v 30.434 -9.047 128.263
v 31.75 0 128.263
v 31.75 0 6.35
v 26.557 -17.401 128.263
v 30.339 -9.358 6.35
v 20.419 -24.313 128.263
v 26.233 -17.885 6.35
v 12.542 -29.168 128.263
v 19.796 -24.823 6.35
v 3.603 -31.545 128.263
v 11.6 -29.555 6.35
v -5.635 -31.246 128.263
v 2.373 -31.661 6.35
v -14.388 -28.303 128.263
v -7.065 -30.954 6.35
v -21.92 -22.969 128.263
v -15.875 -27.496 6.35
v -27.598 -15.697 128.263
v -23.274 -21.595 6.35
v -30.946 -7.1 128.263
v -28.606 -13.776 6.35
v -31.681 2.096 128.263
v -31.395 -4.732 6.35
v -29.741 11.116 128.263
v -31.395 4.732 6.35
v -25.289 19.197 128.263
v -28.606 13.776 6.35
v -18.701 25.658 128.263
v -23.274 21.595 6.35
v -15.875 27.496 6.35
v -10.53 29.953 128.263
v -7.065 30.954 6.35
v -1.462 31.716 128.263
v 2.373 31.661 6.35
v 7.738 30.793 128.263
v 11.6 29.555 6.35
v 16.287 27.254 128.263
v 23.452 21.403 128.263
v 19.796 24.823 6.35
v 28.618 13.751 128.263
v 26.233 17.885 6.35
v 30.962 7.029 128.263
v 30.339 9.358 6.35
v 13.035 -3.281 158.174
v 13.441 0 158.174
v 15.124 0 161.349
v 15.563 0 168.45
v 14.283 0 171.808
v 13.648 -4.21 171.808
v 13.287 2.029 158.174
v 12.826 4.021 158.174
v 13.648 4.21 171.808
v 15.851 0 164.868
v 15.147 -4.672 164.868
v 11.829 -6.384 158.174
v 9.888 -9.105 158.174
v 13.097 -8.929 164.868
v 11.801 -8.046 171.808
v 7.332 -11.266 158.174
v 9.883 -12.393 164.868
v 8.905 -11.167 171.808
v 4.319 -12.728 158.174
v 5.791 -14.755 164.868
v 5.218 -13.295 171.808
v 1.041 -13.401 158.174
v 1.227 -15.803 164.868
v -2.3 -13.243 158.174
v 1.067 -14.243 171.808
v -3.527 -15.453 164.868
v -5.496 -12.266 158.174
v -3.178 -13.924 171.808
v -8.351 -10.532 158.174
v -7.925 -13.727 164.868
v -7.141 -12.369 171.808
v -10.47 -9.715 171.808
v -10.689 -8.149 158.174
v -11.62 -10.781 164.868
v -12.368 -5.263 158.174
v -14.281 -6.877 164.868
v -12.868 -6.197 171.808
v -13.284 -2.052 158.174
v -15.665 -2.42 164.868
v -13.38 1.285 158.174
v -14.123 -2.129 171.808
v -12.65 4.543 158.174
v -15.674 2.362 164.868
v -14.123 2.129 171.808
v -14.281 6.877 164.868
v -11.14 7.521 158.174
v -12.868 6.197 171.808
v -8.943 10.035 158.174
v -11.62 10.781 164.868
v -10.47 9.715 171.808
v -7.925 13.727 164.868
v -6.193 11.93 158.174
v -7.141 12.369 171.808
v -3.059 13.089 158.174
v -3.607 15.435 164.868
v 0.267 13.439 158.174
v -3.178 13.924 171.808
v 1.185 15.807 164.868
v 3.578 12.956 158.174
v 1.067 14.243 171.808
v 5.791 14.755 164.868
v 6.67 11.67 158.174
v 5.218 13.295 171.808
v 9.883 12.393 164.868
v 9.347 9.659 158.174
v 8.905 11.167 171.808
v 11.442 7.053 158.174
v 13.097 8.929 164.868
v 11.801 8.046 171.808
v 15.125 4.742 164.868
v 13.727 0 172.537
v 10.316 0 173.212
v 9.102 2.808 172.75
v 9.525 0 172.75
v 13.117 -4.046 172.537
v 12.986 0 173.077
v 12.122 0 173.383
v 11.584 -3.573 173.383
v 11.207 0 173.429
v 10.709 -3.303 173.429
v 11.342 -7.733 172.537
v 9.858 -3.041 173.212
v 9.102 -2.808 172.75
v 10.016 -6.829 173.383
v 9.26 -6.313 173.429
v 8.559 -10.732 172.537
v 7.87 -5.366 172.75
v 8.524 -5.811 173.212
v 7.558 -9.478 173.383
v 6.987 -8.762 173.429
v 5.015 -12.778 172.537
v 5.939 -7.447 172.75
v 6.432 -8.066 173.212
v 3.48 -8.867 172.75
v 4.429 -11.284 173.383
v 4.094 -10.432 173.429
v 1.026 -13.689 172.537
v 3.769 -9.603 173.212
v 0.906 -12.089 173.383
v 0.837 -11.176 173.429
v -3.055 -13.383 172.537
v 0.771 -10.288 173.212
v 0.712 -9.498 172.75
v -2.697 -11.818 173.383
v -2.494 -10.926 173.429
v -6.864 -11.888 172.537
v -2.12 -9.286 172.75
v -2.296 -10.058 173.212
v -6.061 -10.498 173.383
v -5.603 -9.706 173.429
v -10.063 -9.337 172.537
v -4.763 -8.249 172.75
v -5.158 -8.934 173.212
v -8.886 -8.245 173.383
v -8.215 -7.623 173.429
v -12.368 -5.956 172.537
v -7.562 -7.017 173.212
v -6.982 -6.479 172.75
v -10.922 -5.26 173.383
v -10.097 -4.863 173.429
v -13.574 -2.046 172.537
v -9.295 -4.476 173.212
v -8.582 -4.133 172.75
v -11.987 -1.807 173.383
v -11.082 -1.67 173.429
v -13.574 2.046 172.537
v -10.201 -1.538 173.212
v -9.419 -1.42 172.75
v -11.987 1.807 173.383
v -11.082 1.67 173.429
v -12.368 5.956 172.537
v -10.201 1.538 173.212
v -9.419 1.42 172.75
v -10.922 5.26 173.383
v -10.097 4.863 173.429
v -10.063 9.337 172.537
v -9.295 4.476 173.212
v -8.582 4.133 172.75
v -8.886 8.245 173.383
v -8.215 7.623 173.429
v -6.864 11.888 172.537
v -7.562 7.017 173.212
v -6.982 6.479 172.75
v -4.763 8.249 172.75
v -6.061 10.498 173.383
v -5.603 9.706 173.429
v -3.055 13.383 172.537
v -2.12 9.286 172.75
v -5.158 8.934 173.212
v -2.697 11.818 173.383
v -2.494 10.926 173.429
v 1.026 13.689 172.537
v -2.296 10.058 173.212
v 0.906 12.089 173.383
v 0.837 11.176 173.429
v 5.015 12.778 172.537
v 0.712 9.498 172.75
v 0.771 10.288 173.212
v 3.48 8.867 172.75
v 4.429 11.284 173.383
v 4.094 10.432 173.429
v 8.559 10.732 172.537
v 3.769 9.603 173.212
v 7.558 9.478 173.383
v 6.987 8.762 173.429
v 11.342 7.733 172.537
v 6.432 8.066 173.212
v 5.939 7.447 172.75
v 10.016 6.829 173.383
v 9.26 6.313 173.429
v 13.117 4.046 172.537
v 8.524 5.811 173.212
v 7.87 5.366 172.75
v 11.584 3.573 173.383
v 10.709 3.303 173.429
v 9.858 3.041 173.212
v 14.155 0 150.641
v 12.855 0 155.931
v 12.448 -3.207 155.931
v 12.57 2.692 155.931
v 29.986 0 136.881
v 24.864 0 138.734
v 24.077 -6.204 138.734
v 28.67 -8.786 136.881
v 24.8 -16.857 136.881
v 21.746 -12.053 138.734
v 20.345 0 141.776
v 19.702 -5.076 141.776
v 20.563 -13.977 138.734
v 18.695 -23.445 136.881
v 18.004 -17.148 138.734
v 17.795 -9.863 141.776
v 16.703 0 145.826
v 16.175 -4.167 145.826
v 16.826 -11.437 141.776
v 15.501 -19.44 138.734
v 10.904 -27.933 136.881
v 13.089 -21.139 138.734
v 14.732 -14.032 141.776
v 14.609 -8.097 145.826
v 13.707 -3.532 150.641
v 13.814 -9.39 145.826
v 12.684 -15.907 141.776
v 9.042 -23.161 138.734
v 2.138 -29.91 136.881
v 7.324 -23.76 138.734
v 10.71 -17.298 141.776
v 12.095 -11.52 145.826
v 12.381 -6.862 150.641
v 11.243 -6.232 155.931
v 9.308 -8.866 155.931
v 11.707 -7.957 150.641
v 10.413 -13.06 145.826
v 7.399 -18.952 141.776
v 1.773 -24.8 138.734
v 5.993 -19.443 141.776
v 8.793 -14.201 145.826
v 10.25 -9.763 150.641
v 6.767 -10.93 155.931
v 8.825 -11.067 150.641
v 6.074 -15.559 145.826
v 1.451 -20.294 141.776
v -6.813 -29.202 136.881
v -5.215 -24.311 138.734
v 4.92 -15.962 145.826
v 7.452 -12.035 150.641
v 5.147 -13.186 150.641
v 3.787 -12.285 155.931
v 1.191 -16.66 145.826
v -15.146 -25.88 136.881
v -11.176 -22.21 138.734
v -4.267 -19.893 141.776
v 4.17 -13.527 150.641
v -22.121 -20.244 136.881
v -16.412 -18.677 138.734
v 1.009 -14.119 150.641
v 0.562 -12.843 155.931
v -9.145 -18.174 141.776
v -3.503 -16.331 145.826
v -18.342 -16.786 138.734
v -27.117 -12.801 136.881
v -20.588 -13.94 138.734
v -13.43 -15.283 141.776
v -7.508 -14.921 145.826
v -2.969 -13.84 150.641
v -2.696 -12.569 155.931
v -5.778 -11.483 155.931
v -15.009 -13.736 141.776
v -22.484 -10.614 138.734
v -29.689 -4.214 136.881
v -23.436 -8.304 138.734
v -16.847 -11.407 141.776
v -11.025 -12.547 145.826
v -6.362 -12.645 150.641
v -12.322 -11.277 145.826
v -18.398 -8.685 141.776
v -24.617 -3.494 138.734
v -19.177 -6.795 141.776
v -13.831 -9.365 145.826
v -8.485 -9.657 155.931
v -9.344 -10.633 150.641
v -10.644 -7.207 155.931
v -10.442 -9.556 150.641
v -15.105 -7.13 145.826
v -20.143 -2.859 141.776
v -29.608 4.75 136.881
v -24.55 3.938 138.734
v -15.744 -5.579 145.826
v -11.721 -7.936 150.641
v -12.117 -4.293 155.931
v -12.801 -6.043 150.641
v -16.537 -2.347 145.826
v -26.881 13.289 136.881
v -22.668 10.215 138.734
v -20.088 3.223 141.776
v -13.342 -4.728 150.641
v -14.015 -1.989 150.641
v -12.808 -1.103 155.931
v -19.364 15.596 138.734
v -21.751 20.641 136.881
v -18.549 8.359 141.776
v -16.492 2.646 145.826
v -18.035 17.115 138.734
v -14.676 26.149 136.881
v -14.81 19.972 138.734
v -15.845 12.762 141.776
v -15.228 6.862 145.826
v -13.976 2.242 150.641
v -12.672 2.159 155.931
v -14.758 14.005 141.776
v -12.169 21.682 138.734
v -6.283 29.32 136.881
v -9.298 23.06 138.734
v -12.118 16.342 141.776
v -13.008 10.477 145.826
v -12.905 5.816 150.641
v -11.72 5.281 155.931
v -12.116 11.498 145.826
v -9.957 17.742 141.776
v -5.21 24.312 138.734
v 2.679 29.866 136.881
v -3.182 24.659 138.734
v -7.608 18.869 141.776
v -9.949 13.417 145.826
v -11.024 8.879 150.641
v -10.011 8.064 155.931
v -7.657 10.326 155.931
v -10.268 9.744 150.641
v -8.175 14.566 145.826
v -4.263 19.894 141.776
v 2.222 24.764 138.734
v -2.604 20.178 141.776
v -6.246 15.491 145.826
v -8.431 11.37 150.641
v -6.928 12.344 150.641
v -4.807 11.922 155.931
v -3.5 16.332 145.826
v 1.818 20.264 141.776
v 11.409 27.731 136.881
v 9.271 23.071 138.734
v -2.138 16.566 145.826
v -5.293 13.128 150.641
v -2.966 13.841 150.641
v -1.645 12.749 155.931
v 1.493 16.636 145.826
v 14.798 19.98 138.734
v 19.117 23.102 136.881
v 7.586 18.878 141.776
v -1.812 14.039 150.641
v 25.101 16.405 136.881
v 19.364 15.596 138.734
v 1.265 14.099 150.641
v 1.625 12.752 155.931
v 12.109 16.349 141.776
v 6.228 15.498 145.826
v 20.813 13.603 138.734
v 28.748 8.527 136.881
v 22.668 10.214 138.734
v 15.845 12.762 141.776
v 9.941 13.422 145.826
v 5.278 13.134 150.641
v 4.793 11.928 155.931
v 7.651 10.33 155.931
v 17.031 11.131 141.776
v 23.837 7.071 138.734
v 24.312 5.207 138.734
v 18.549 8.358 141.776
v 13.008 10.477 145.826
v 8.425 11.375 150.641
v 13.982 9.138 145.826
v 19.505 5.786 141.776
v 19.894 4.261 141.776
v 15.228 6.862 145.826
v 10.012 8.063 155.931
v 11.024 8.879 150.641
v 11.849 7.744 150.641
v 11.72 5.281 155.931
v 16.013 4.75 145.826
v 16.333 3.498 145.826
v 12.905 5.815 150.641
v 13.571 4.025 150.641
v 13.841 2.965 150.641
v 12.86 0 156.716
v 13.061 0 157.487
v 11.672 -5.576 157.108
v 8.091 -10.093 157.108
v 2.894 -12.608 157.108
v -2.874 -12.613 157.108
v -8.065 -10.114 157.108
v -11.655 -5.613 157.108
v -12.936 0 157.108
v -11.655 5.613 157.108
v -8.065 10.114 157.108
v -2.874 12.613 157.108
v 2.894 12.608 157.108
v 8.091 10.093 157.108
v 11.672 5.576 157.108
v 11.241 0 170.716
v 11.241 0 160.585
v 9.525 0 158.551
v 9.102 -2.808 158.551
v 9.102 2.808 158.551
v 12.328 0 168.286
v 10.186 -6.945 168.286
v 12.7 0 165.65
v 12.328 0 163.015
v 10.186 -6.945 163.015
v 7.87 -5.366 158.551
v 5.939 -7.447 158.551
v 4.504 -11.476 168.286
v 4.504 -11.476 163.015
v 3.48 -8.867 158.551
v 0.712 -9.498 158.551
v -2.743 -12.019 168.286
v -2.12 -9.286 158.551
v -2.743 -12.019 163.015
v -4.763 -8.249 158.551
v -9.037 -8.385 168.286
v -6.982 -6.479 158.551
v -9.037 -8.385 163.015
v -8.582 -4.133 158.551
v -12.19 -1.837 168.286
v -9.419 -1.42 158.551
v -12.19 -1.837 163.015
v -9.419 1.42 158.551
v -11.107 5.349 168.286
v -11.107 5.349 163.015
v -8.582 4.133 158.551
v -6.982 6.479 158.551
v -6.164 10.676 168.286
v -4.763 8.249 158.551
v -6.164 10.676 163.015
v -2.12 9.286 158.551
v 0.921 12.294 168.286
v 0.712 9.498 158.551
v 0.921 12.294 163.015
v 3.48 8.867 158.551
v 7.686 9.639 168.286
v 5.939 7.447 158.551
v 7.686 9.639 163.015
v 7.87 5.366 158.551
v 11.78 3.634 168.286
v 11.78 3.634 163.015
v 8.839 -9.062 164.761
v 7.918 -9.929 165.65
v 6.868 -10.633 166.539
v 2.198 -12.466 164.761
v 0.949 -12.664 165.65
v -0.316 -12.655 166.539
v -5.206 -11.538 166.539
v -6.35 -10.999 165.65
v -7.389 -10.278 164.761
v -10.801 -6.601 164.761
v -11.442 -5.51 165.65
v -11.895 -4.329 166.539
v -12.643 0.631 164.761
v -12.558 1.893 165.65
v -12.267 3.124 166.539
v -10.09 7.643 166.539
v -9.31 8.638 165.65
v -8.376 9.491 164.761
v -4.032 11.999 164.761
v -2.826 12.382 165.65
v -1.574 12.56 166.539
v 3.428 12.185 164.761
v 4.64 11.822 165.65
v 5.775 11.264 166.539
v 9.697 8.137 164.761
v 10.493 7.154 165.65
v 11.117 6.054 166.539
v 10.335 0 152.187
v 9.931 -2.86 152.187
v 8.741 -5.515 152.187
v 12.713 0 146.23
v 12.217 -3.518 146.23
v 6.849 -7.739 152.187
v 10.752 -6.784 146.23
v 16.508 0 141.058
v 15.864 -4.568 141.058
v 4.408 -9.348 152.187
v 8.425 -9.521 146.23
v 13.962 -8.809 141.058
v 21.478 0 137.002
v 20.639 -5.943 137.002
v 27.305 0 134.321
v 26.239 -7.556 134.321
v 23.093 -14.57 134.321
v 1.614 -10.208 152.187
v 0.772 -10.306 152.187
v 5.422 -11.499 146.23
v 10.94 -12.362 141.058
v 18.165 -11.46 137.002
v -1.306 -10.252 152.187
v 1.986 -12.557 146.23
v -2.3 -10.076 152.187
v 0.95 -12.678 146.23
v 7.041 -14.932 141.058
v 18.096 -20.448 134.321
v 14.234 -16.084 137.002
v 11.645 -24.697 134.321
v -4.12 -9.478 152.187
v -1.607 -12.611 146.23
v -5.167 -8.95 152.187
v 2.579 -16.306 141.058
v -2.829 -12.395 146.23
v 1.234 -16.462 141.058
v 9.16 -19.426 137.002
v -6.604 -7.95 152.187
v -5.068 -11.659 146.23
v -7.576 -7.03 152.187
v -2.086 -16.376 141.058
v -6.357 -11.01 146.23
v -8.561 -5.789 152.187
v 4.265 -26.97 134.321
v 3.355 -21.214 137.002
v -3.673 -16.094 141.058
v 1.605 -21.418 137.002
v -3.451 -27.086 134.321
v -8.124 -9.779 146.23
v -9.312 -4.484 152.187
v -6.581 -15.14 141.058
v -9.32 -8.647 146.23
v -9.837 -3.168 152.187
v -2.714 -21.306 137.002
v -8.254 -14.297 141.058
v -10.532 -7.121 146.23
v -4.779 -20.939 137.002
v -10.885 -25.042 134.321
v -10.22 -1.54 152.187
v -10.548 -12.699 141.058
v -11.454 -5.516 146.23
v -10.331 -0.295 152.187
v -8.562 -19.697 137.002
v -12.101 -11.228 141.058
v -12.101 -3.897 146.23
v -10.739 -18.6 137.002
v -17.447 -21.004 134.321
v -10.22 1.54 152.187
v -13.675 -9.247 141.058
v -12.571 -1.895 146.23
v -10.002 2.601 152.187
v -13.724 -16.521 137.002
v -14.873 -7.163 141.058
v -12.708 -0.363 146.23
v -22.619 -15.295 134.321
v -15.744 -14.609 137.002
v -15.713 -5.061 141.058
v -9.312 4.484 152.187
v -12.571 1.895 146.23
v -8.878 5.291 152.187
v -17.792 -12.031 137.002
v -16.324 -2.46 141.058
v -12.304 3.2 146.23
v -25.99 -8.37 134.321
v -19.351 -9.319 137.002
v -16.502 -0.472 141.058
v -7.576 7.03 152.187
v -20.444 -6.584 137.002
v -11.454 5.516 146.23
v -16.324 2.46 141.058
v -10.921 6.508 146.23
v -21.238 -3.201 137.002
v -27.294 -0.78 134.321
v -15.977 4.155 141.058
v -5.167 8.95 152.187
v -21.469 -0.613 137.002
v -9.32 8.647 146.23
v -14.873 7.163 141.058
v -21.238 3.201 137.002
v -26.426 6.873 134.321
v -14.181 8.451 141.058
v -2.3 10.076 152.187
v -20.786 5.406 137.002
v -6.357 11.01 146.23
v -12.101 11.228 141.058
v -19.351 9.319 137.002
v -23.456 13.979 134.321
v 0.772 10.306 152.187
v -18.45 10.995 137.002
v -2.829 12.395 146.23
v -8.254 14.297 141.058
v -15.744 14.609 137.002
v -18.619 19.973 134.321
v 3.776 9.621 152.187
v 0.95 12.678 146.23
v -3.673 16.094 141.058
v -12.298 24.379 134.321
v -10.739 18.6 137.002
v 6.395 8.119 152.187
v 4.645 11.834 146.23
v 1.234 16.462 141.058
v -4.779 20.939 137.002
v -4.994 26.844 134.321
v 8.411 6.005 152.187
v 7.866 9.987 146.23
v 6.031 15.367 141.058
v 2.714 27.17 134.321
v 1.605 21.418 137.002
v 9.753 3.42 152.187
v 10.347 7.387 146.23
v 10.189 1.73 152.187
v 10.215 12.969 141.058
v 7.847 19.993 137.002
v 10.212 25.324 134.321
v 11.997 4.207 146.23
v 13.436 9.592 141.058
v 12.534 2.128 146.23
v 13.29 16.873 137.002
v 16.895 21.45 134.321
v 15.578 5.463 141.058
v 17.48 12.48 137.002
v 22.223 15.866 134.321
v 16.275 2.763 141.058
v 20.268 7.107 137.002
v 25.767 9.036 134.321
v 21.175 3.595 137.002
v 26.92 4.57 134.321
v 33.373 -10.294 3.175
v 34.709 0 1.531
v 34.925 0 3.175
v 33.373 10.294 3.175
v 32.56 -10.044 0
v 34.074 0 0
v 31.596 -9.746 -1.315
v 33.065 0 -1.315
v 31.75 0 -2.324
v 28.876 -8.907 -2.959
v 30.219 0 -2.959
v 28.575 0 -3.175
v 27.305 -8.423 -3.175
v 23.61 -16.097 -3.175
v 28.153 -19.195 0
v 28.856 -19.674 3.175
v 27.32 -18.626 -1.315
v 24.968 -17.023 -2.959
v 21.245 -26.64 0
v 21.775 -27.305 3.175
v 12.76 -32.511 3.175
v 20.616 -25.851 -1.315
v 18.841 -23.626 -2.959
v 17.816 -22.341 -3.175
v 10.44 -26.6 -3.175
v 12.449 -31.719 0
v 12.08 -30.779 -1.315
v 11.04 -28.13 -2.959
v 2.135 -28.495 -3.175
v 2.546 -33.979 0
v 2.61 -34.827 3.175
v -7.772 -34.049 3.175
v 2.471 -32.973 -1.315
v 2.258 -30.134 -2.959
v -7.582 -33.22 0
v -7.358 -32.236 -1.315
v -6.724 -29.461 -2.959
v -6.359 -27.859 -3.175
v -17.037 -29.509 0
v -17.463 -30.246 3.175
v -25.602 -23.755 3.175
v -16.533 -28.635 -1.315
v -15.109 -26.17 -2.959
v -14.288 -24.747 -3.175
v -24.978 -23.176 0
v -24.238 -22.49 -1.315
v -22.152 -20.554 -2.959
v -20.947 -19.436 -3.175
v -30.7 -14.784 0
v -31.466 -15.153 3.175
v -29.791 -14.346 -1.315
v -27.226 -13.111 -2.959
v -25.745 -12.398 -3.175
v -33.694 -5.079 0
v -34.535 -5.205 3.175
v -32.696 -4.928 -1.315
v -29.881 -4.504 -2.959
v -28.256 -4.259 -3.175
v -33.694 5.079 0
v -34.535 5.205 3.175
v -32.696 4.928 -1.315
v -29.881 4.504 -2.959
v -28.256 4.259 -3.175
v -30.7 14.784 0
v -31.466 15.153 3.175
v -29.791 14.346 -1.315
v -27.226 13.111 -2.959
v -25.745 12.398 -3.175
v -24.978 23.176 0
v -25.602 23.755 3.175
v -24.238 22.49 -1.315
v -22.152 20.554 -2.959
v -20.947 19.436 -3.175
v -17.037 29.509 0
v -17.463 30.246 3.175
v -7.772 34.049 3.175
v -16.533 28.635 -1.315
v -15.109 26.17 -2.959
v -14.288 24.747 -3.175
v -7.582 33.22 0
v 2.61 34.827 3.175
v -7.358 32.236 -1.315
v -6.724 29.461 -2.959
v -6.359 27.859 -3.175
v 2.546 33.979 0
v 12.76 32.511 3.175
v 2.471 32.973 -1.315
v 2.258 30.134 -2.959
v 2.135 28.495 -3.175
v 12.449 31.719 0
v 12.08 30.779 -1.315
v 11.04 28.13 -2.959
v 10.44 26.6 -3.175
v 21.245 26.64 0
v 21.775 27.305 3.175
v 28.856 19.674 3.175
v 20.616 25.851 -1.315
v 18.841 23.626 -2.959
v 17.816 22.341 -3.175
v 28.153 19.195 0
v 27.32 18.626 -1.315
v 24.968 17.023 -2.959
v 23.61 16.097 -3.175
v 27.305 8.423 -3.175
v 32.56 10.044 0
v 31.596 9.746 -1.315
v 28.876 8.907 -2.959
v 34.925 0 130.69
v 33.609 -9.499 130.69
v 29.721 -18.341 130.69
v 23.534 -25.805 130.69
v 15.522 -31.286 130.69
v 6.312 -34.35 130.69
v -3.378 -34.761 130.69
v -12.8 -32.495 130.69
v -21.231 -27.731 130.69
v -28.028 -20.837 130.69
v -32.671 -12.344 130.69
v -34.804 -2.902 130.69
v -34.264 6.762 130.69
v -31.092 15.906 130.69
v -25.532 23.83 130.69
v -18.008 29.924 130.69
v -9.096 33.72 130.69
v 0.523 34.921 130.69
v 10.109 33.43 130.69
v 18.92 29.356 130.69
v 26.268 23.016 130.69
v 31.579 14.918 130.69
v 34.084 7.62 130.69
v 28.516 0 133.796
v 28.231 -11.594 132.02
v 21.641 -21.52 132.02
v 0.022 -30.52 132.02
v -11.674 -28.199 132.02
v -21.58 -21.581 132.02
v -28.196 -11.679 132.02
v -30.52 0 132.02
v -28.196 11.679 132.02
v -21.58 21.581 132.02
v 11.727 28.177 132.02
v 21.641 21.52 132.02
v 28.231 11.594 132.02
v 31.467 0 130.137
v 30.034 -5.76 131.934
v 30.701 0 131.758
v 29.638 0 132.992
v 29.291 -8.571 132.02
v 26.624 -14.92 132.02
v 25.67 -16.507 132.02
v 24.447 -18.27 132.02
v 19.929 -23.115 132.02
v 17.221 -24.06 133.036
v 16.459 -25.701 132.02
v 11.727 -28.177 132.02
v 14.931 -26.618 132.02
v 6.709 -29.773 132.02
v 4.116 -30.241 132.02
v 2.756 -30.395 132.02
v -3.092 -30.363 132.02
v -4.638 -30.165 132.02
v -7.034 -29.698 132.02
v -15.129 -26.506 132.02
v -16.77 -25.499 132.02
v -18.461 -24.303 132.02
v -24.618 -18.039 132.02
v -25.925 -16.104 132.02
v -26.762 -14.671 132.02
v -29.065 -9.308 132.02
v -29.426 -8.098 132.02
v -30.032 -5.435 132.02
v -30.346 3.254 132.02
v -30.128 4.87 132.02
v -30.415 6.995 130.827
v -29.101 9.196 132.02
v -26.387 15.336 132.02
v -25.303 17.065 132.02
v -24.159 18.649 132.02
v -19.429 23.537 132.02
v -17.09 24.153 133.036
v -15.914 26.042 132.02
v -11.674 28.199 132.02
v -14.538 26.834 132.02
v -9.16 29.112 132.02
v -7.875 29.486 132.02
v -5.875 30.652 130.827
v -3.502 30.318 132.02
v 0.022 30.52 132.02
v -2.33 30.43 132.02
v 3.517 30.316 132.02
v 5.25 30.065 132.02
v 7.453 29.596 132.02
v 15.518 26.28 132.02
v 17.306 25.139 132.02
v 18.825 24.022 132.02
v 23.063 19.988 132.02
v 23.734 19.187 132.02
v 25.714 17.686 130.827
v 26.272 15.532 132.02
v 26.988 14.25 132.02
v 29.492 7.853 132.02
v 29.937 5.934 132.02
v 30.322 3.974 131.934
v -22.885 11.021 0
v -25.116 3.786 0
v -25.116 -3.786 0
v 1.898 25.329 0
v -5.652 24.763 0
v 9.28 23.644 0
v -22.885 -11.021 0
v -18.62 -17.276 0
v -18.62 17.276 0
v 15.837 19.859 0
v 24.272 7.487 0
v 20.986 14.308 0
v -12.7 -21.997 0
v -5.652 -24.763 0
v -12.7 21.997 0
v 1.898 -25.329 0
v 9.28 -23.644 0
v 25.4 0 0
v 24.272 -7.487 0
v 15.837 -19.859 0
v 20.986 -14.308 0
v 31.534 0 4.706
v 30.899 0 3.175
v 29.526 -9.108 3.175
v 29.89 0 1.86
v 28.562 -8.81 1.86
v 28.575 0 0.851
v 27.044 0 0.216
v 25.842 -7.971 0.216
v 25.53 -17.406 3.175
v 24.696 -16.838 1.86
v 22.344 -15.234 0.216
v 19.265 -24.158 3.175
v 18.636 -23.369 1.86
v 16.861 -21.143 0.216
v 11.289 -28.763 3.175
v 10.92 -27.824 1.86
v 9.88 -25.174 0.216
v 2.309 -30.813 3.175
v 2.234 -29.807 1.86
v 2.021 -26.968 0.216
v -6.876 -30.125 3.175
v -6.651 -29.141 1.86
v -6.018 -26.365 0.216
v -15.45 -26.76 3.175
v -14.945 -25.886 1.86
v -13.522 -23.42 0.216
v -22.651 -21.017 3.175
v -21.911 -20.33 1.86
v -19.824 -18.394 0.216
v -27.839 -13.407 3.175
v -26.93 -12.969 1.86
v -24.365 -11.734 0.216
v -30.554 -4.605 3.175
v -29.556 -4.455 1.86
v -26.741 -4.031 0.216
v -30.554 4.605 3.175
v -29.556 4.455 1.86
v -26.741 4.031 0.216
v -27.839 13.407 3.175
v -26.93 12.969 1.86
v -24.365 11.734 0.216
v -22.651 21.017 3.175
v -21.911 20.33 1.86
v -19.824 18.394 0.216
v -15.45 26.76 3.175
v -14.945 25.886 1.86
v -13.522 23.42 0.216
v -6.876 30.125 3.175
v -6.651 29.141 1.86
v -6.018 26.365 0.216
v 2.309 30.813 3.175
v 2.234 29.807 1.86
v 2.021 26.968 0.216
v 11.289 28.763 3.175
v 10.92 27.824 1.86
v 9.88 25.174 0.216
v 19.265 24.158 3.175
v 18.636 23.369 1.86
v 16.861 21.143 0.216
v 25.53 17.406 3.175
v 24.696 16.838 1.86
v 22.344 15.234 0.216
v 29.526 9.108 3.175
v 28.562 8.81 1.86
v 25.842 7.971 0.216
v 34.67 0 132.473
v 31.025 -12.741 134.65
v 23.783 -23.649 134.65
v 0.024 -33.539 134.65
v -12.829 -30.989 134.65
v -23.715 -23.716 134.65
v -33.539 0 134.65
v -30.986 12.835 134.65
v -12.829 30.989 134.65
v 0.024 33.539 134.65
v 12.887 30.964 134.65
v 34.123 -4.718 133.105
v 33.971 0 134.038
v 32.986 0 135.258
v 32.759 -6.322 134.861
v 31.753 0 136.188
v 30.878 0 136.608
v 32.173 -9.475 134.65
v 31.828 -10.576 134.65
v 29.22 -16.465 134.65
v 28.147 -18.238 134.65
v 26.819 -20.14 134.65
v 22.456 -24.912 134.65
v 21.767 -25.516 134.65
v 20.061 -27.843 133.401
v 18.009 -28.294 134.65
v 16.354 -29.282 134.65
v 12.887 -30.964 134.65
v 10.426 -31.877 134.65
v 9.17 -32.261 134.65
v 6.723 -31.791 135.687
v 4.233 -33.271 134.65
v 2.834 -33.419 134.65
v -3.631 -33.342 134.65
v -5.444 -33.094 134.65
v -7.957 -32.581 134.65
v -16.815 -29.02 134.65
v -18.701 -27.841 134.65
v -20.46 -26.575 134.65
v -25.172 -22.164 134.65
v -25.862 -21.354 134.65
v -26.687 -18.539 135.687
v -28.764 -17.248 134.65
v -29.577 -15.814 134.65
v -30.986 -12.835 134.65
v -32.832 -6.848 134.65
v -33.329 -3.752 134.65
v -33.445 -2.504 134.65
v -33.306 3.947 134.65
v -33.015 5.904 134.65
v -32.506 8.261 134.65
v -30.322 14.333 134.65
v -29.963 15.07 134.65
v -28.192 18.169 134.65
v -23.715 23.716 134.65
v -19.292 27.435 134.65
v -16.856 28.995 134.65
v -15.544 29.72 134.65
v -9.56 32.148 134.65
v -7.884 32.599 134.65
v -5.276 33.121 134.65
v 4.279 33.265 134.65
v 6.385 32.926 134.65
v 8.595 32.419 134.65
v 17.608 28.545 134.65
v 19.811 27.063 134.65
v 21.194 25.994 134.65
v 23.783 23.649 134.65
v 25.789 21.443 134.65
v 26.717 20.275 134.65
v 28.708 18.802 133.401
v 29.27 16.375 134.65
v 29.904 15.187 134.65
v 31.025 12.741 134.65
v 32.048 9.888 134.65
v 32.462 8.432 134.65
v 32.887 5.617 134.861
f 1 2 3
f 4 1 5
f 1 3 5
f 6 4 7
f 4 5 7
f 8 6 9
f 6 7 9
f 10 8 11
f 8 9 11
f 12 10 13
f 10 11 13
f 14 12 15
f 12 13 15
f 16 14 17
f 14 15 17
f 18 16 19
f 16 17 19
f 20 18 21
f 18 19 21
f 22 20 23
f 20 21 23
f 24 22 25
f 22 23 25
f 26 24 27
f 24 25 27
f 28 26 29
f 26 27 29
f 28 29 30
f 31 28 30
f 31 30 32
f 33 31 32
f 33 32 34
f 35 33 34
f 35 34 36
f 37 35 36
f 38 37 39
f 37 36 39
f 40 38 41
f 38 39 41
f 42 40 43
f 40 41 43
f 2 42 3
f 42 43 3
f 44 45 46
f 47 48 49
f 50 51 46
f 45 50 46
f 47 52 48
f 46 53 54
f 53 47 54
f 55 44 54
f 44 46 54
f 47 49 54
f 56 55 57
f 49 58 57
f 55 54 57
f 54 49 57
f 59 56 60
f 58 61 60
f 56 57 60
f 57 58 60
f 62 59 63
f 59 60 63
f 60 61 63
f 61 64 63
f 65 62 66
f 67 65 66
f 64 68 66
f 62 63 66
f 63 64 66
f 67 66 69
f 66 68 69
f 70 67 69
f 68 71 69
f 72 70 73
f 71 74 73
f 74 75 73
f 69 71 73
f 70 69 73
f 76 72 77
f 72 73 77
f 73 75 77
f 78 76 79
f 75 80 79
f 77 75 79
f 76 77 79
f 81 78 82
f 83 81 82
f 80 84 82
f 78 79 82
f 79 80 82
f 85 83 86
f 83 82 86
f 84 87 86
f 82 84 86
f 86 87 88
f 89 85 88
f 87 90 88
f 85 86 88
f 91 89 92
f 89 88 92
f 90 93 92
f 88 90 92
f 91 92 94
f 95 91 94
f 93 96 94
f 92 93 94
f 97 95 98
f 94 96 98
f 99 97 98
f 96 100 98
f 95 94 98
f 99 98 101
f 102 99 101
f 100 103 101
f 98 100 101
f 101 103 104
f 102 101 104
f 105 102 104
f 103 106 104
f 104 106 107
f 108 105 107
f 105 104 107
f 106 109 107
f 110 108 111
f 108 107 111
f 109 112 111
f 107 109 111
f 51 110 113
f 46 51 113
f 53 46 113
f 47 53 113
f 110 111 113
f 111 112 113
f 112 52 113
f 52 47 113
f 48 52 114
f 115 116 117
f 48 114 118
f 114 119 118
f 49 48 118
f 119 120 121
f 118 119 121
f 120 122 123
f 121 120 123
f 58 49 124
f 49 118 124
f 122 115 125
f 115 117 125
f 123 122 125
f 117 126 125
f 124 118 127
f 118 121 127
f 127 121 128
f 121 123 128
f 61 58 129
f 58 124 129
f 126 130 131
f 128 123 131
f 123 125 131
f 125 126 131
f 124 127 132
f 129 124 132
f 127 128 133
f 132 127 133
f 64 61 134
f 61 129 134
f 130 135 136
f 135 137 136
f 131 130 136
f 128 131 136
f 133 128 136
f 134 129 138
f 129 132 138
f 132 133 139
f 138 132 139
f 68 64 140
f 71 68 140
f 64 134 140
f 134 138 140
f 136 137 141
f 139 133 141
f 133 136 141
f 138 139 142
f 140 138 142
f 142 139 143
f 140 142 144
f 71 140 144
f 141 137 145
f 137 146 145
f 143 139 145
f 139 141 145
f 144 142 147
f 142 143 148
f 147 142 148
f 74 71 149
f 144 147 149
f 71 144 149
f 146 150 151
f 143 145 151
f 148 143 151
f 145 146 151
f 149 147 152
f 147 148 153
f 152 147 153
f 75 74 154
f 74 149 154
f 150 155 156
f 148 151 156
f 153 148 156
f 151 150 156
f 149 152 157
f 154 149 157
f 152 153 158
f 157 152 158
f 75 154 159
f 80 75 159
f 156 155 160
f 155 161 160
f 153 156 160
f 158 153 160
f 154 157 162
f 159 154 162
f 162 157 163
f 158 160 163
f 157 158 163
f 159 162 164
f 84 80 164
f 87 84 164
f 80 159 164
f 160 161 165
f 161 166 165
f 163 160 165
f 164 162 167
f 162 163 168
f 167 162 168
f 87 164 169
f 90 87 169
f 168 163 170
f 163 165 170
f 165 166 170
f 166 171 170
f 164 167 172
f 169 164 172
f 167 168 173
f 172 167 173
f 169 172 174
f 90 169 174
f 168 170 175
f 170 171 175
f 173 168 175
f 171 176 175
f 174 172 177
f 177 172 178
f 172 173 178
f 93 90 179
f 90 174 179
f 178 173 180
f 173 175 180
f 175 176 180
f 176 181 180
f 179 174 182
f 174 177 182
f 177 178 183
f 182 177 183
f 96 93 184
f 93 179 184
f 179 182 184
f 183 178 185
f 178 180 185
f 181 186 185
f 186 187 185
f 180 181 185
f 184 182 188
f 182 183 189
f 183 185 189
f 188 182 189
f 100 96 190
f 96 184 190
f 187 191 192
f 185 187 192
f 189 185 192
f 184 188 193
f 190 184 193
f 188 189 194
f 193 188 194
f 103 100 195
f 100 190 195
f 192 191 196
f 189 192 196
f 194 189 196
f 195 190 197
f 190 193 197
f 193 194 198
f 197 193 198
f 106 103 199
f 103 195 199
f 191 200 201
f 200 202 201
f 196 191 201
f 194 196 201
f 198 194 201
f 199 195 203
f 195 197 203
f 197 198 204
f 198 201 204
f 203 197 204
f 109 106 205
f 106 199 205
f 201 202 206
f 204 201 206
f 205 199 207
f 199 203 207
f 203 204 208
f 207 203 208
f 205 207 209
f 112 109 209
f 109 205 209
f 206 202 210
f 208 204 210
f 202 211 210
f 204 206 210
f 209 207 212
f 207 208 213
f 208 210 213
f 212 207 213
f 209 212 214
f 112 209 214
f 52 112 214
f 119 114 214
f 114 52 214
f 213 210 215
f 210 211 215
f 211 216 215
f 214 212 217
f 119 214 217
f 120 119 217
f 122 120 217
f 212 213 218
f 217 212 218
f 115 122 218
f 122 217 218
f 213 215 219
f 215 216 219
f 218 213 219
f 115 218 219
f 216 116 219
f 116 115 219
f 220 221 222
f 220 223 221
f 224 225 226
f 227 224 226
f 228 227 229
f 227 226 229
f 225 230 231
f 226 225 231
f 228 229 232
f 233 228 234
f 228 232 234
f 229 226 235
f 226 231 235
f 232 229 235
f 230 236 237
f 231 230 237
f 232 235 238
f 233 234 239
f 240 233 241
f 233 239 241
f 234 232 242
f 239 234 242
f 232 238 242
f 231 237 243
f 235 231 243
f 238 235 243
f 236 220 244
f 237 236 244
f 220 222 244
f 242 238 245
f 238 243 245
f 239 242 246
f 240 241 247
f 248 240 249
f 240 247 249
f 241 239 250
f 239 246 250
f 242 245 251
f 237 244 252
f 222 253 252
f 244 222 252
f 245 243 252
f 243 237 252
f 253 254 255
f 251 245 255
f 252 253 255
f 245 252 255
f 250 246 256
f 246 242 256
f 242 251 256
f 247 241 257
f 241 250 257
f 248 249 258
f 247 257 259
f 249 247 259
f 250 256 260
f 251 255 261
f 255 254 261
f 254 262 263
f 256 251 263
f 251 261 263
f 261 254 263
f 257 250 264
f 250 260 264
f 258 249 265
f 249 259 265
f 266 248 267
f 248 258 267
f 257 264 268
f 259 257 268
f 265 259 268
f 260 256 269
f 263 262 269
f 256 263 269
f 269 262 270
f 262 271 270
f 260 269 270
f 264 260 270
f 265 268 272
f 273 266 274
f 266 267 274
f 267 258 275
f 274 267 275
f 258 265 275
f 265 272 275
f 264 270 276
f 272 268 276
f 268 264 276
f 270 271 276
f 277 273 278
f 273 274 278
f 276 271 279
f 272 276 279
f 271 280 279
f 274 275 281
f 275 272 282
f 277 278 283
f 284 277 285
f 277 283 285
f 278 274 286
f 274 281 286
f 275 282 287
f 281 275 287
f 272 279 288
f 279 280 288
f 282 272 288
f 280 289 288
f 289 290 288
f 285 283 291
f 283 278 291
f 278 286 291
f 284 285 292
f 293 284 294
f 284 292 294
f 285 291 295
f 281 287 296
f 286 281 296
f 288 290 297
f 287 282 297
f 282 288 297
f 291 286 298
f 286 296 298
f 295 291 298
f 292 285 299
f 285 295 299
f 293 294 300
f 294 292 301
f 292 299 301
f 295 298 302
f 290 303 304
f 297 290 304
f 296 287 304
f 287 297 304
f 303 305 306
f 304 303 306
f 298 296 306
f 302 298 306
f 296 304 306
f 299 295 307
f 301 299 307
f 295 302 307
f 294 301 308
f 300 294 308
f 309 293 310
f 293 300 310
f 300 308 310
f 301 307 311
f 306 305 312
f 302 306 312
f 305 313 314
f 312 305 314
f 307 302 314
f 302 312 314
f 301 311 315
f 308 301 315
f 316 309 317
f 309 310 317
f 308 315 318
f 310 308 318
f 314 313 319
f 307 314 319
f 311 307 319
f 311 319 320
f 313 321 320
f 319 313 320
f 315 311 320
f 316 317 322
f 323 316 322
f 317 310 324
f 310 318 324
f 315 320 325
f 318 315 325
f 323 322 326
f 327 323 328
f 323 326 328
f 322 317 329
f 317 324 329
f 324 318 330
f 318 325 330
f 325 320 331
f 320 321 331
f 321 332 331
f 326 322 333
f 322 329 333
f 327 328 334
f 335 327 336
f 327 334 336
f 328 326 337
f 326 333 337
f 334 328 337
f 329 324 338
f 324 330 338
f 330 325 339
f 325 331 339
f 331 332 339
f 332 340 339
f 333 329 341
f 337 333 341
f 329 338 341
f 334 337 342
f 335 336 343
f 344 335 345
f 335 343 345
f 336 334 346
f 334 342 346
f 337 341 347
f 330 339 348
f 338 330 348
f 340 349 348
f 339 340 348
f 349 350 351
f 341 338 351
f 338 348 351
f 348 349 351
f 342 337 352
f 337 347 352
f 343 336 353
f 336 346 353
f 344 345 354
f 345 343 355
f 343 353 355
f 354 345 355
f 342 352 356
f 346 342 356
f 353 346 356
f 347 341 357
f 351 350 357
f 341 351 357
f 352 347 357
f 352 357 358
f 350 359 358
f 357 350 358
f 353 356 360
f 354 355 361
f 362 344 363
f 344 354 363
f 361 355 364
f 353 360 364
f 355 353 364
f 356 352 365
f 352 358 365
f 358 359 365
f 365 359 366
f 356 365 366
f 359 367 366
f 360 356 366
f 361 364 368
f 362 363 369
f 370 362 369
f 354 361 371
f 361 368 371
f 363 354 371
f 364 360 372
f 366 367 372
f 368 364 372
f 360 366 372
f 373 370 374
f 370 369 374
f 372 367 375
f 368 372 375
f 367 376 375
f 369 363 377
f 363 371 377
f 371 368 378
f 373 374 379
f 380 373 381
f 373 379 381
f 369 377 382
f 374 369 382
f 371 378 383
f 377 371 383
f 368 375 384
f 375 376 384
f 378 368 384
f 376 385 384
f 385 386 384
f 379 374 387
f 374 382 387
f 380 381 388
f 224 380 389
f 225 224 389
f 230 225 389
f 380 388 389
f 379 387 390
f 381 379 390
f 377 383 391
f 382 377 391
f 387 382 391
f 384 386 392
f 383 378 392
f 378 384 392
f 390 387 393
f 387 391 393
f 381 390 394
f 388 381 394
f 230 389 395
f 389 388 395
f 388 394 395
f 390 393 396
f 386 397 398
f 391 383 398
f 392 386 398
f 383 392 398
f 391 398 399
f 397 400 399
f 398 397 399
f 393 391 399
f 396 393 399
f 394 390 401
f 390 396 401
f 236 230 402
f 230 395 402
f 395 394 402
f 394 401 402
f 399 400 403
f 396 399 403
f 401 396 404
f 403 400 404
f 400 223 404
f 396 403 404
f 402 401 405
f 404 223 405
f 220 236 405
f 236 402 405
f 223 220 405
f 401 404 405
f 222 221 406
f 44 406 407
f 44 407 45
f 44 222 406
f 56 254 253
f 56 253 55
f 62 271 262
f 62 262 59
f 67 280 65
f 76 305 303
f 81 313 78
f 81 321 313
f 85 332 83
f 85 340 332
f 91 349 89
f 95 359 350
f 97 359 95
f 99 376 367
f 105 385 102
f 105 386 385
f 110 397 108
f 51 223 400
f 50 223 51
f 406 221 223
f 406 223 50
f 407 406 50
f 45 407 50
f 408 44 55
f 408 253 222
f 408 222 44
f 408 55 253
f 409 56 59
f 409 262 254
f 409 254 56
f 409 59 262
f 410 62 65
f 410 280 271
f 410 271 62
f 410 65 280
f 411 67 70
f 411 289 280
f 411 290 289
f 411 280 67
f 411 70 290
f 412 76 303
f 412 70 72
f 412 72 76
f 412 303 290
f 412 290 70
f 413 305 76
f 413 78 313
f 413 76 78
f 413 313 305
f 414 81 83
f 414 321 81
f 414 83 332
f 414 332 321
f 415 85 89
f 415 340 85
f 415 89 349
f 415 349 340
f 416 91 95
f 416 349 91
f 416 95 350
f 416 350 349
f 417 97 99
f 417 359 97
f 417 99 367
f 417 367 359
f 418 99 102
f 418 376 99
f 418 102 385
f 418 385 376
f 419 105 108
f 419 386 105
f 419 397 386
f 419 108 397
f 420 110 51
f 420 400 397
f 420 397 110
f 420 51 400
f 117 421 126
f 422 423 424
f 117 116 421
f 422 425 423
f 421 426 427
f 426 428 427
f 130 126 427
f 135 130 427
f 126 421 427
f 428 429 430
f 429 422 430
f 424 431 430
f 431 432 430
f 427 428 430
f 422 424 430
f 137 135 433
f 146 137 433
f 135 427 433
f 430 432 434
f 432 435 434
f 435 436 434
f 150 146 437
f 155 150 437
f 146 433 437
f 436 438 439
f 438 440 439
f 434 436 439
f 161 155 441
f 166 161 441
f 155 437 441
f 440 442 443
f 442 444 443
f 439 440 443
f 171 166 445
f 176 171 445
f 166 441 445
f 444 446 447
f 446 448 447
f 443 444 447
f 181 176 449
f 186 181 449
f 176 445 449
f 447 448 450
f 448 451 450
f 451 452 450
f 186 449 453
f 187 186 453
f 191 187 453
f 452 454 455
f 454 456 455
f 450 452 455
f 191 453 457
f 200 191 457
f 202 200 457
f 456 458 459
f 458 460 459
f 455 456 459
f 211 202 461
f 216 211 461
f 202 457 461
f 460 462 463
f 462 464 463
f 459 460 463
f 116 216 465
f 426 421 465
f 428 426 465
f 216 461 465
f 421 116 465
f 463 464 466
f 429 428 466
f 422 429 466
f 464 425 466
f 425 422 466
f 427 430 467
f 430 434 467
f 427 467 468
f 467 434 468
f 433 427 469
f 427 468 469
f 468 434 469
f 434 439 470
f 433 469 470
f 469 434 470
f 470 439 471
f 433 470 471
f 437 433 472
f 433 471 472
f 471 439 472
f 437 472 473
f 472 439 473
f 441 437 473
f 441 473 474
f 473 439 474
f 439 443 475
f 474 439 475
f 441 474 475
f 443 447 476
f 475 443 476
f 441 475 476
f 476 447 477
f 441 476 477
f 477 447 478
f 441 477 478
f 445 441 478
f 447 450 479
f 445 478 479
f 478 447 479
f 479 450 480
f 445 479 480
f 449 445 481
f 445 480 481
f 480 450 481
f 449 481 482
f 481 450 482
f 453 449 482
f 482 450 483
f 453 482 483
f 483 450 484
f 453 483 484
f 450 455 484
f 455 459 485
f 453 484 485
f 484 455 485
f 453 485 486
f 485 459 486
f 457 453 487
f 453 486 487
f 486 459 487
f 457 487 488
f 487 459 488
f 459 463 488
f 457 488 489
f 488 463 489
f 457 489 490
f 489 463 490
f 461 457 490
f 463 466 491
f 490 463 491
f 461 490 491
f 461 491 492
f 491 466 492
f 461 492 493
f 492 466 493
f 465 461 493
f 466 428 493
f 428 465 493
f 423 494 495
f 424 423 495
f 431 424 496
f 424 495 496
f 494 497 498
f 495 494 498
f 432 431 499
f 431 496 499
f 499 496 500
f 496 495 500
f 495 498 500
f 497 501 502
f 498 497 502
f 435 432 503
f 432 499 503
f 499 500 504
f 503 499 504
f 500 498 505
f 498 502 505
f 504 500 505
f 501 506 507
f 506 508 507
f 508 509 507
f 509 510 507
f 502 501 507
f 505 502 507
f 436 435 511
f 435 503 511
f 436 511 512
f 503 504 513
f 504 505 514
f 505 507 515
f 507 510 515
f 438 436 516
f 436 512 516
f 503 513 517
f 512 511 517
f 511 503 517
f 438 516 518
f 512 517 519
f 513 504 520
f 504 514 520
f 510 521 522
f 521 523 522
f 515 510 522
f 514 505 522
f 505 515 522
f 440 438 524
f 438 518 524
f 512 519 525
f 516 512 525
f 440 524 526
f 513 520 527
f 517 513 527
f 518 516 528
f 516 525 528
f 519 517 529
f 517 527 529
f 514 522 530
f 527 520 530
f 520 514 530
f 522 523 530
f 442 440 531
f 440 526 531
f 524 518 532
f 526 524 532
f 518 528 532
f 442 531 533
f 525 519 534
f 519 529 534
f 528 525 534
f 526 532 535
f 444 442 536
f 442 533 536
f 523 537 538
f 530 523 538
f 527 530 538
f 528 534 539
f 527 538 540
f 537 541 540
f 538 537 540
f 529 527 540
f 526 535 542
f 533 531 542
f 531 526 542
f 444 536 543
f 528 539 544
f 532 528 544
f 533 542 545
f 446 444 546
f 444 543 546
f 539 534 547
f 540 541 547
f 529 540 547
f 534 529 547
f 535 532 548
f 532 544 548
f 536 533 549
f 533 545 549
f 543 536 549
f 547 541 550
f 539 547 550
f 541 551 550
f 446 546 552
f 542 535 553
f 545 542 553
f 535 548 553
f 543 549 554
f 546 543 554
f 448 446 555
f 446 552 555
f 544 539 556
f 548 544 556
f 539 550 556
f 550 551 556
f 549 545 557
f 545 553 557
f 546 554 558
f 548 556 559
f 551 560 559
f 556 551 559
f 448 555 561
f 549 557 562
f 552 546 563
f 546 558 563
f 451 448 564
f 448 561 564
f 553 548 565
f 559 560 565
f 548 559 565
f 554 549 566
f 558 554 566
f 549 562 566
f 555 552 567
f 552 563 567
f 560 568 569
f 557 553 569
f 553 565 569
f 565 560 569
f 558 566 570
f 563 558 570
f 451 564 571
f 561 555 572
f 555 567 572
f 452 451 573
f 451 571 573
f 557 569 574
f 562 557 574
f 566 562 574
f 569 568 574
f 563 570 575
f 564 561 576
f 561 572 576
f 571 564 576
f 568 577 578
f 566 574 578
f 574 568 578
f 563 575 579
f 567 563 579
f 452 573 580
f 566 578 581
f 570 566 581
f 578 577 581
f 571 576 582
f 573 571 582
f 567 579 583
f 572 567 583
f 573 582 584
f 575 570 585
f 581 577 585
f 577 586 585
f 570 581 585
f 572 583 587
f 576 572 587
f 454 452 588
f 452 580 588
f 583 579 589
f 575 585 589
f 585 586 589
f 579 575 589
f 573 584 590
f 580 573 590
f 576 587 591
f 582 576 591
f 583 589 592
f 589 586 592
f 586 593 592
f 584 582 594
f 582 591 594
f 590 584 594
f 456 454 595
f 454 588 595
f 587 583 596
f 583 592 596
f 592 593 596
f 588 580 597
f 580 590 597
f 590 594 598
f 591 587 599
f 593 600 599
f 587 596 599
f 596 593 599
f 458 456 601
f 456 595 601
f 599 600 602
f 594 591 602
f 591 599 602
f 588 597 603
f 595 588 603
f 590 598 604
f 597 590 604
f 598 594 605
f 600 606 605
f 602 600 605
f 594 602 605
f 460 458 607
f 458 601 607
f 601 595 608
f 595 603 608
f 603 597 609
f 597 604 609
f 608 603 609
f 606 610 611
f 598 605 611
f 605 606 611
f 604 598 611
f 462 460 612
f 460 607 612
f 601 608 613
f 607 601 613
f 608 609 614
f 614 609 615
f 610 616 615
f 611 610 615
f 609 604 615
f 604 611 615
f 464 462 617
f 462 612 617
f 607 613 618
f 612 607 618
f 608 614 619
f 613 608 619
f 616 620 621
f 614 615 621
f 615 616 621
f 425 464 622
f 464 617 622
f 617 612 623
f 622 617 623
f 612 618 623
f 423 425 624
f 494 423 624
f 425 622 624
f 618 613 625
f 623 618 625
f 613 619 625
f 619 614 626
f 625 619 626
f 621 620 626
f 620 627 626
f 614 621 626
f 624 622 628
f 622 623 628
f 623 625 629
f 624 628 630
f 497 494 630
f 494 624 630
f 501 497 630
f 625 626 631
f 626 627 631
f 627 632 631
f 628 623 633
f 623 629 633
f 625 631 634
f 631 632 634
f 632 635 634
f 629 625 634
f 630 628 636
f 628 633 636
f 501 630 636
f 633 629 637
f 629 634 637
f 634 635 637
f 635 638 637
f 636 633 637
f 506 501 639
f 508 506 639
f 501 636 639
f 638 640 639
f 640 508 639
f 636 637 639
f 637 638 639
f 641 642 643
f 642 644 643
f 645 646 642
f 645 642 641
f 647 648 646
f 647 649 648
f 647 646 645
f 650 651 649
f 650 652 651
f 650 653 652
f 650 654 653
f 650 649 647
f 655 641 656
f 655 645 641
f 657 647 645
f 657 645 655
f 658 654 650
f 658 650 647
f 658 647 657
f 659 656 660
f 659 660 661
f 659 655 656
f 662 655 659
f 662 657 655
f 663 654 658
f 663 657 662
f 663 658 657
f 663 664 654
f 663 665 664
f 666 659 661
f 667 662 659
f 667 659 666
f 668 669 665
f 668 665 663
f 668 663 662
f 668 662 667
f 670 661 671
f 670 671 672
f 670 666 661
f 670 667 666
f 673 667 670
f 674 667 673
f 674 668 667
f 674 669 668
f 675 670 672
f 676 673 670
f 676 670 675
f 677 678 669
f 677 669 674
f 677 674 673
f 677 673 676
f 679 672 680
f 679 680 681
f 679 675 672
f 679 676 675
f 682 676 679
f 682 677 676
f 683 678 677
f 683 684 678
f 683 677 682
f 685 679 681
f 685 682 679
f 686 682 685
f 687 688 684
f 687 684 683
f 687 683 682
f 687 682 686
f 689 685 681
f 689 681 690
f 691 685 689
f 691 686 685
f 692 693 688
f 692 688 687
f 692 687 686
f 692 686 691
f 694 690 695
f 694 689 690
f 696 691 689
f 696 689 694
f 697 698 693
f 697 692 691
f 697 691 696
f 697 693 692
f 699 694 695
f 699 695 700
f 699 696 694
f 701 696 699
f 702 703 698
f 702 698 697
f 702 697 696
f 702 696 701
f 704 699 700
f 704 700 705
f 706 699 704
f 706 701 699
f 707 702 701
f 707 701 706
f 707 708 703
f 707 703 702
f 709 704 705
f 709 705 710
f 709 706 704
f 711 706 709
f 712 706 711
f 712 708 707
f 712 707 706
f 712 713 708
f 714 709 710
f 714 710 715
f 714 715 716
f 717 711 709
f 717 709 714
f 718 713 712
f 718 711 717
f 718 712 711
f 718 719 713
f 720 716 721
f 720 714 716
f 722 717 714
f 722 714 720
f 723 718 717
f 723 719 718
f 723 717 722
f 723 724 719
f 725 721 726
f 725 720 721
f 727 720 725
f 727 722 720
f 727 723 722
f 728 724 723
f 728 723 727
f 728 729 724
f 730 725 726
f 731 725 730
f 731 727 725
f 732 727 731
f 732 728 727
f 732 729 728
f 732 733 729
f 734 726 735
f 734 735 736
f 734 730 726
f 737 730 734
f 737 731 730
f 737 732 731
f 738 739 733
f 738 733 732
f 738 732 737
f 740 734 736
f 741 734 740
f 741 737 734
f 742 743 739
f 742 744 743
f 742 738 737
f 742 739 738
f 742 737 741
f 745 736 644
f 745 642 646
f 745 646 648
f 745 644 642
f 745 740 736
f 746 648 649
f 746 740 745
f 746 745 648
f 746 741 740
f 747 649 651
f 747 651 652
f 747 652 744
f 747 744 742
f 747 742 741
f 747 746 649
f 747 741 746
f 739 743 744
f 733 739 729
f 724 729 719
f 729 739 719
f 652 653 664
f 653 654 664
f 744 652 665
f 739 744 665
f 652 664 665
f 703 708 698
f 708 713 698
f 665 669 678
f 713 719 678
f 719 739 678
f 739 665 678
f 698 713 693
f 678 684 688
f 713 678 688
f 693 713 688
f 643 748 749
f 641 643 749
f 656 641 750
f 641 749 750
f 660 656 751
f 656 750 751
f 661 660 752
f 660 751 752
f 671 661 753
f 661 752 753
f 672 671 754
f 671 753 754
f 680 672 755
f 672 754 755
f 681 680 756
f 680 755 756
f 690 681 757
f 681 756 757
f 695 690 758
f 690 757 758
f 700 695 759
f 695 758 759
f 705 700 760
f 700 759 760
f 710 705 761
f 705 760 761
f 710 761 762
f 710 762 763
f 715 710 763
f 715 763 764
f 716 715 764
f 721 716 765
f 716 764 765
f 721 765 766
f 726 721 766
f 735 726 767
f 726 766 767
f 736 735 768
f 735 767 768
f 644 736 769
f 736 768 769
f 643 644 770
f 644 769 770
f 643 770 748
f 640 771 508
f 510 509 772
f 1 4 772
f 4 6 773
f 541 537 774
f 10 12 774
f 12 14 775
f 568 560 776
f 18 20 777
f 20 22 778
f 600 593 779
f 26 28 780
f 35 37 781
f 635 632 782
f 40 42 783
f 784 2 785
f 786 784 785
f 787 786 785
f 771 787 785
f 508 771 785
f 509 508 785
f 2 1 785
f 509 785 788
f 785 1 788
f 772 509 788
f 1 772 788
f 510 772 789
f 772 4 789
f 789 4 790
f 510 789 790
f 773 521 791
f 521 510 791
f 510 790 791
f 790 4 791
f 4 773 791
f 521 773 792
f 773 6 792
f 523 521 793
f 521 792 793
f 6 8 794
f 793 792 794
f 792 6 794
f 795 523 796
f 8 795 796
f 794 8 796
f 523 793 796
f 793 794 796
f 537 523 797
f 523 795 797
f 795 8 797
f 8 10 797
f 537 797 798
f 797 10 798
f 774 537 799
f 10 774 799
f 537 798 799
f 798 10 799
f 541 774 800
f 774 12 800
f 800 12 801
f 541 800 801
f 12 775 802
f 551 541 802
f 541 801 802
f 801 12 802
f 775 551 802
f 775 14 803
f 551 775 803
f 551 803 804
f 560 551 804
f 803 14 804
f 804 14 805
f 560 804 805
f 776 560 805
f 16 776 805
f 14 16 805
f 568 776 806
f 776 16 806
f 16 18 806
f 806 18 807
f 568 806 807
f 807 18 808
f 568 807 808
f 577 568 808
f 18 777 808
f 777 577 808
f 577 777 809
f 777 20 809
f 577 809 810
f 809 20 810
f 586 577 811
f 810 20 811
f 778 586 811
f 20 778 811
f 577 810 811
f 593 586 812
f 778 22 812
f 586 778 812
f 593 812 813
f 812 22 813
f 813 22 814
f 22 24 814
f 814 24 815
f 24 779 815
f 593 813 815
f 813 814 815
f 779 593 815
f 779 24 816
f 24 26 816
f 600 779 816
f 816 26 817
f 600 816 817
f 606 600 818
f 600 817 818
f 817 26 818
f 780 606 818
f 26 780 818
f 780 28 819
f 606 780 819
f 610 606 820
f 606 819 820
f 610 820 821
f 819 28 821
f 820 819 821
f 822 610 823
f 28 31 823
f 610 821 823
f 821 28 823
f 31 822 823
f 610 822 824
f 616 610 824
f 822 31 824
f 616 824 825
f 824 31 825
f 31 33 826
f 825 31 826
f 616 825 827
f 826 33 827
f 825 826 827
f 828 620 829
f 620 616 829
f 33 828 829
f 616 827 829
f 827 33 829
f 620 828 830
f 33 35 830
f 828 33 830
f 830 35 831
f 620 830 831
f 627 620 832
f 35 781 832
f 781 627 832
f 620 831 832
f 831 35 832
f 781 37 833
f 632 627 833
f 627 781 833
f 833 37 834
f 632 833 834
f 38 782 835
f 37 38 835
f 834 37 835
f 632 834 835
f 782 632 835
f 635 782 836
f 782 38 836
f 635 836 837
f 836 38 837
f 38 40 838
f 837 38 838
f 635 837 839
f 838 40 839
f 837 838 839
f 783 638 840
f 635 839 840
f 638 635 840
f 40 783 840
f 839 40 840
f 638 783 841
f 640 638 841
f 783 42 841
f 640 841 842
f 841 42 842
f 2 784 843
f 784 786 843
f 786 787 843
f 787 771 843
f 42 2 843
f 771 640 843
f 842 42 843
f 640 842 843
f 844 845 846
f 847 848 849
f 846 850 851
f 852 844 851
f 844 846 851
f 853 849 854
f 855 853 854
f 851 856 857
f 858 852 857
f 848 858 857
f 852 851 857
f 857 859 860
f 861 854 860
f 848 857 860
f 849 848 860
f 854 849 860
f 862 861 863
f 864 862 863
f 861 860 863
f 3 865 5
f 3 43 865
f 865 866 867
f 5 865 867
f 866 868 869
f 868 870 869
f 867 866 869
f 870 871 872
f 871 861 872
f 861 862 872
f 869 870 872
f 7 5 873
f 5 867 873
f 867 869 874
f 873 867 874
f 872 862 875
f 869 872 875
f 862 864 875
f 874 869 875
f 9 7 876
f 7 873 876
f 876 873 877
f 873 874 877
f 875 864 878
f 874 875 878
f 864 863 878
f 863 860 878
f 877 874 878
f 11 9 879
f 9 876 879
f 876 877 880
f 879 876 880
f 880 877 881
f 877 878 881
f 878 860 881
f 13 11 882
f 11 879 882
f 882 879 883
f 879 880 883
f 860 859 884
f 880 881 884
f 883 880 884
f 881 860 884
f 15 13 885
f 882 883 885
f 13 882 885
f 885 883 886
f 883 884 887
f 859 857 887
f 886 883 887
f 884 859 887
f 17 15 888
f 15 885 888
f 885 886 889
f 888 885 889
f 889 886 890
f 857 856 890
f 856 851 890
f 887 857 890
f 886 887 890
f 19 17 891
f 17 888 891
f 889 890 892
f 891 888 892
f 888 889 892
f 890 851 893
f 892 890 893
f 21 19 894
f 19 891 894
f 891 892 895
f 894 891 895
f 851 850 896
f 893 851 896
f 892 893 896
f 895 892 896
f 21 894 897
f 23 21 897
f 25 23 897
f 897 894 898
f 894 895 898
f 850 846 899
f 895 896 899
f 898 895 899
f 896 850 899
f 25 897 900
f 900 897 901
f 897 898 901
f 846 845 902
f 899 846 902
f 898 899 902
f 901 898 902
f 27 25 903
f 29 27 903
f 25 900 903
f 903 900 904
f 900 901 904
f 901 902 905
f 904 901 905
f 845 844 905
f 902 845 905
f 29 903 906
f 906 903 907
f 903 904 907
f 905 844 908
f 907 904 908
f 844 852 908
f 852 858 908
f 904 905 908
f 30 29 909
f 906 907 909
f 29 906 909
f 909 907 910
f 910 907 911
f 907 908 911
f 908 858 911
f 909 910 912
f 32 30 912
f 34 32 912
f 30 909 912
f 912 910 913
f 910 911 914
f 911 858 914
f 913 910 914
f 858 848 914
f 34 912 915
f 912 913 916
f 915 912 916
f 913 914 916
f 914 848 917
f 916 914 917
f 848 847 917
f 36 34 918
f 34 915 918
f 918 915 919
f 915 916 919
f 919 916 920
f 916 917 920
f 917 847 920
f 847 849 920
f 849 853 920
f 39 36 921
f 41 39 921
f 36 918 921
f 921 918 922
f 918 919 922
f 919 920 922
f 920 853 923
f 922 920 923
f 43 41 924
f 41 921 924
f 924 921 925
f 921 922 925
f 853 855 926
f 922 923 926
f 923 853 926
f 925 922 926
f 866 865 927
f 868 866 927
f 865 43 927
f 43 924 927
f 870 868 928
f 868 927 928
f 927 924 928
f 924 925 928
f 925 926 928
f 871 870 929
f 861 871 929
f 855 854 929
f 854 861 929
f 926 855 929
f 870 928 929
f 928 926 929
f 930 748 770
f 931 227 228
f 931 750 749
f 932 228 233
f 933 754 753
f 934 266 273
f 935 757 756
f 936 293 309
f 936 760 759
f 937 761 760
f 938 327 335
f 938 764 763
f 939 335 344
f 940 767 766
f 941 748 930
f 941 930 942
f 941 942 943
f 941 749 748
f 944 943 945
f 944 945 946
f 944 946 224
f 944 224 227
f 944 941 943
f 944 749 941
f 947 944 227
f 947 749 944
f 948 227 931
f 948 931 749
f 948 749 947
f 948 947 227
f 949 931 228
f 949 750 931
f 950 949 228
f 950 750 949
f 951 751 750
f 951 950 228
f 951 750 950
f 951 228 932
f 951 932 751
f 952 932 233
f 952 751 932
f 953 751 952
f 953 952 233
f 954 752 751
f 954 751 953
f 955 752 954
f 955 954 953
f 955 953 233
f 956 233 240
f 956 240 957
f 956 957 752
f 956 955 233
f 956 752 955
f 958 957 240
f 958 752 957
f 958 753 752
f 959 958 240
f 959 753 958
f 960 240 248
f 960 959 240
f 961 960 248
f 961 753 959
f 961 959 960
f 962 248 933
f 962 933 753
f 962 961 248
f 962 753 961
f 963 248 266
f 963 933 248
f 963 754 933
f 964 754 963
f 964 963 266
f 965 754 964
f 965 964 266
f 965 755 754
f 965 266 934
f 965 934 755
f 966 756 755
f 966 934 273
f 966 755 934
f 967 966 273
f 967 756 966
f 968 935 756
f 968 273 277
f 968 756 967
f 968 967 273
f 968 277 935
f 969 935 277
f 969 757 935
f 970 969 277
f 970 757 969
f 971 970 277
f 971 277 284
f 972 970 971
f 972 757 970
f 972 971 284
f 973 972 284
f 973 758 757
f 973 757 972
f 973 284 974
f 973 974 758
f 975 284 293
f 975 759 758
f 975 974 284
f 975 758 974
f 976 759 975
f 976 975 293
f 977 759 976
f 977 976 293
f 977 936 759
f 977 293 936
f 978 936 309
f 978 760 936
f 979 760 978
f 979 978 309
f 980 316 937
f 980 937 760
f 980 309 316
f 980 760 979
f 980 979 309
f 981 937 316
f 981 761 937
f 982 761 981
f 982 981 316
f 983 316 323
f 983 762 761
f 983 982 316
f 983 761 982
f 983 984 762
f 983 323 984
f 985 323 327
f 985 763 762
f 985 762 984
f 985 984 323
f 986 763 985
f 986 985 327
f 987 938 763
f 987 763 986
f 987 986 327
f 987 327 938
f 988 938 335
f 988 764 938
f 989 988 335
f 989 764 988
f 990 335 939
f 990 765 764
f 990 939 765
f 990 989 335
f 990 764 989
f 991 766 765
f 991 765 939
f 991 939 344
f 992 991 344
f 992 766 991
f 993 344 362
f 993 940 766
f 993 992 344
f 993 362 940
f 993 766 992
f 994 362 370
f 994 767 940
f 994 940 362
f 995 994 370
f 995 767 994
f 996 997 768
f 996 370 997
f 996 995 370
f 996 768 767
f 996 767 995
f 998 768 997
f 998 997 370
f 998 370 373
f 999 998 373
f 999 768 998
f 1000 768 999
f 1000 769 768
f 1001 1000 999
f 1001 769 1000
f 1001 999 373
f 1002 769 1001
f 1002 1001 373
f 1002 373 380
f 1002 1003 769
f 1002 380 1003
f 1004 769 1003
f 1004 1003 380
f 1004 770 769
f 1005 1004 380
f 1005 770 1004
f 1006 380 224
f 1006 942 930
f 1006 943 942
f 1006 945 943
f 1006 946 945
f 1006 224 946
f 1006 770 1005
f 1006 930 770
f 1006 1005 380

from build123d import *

# Parameters (mm, degrees)
F2_R = 6.35
F3_R = 6.35
F5_R = 3.175
F6_R = 6.35
F7_R = 6.35


# Not quite as in the source:
# - a fillet or chamfer that OpenCascade refuses, or shapes differently, is made with other operations: its cross-section is extruded or revolved along the edge and cut away or added


with BuildPart() as f1:
    # F0 (on Front) → F1 (revolve)
    with BuildSketch(Plane.XZ):
        with BuildLine():
            Line((31.75, 0), (0, 0))
            Line((0, 0), (0, -3.175))
            Line((0, -3.175), (34.925, -3.175))
            Line((34.925, -3.175), (34.925, 136.3257812379))
            ThreePointArc((34.925, 136.3257812379), (19.661541674, 142.3959842744), (12.7357473371, 157.2907450236))
            ThreePointArc((12.7357473371, 157.2907450236), (15.7038360971, 167.7283408709), (9.525, 176.6488196945))
            Line((9.525, 176.6488196945), (9.525, 172.749812895))
            ThreePointArc((9.525, 172.749812895), (12.7, 165.6502970665), (9.525, 158.5507812379))
            ThreePointArc((9.525, 158.5507812379), (15.875, 141.7502604126), (31.75, 133.35))
            Line((31.75, 133.35), (31.75, 0))
        make_face()
    revolve(axis=Axis((0, 0, 88.3244098473), (0, 0, -1)))

    # F2
    f2_edges = [f1.edges().sort_by_distance(p)[0] for p in [
        (-34.925, 0, 136.325781),
    ]]
    fillet(f2_edges, radius=F2_R)

    # F3
    f3_edges = [f1.edges().sort_by_distance(p)[0] for p in [
        (-34.925, 0, -3.175),
    ]]
    fillet(f3_edges, radius=F3_R)

    # F4: fillet of radius 3.175 on 1 edges, made by hand

    # F4_s1 → F4_t2 (revolve, cut)
    with BuildSketch(Plane.XZ):
        with BuildLine():
            ThreePointArc((14.2825038565, 171.8076794711), (12.1223989967, 173.382851233), (9.525, 172.749812895))
            Line((9.525, 172.749812895), (9.525, 176.6488196945))
            ThreePointArc((9.525, 176.6488196945), (12.2331604032, 174.5519671406), (14.2825038565, 171.8076794711))
        make_face()
    revolve(axis=Axis((0, 0, 176.6488196945), (0, 0, -1)), mode=Mode.SUBTRACT)

    # F5
    f5_edges = [f1.edges().sort_by_distance(p)[0] for p in [
        (-12.735747, 0, 157.290745),
    ]]
    fillet(f5_edges, radius=F5_R)

    # F6
    f6_edges = [f1.edges().sort_by_distance(p)[0] for p in [
        (-31.75, 0, 0),
    ]]
    fillet(f6_edges, radius=F6_R)

    # F7
    f7_edges = [f1.edges().sort_by_distance(p)[0] for p in [
        (-31.75, 0, 133.35),
    ]]
    fillet(f7_edges, radius=F7_R)


solid = f1.part
